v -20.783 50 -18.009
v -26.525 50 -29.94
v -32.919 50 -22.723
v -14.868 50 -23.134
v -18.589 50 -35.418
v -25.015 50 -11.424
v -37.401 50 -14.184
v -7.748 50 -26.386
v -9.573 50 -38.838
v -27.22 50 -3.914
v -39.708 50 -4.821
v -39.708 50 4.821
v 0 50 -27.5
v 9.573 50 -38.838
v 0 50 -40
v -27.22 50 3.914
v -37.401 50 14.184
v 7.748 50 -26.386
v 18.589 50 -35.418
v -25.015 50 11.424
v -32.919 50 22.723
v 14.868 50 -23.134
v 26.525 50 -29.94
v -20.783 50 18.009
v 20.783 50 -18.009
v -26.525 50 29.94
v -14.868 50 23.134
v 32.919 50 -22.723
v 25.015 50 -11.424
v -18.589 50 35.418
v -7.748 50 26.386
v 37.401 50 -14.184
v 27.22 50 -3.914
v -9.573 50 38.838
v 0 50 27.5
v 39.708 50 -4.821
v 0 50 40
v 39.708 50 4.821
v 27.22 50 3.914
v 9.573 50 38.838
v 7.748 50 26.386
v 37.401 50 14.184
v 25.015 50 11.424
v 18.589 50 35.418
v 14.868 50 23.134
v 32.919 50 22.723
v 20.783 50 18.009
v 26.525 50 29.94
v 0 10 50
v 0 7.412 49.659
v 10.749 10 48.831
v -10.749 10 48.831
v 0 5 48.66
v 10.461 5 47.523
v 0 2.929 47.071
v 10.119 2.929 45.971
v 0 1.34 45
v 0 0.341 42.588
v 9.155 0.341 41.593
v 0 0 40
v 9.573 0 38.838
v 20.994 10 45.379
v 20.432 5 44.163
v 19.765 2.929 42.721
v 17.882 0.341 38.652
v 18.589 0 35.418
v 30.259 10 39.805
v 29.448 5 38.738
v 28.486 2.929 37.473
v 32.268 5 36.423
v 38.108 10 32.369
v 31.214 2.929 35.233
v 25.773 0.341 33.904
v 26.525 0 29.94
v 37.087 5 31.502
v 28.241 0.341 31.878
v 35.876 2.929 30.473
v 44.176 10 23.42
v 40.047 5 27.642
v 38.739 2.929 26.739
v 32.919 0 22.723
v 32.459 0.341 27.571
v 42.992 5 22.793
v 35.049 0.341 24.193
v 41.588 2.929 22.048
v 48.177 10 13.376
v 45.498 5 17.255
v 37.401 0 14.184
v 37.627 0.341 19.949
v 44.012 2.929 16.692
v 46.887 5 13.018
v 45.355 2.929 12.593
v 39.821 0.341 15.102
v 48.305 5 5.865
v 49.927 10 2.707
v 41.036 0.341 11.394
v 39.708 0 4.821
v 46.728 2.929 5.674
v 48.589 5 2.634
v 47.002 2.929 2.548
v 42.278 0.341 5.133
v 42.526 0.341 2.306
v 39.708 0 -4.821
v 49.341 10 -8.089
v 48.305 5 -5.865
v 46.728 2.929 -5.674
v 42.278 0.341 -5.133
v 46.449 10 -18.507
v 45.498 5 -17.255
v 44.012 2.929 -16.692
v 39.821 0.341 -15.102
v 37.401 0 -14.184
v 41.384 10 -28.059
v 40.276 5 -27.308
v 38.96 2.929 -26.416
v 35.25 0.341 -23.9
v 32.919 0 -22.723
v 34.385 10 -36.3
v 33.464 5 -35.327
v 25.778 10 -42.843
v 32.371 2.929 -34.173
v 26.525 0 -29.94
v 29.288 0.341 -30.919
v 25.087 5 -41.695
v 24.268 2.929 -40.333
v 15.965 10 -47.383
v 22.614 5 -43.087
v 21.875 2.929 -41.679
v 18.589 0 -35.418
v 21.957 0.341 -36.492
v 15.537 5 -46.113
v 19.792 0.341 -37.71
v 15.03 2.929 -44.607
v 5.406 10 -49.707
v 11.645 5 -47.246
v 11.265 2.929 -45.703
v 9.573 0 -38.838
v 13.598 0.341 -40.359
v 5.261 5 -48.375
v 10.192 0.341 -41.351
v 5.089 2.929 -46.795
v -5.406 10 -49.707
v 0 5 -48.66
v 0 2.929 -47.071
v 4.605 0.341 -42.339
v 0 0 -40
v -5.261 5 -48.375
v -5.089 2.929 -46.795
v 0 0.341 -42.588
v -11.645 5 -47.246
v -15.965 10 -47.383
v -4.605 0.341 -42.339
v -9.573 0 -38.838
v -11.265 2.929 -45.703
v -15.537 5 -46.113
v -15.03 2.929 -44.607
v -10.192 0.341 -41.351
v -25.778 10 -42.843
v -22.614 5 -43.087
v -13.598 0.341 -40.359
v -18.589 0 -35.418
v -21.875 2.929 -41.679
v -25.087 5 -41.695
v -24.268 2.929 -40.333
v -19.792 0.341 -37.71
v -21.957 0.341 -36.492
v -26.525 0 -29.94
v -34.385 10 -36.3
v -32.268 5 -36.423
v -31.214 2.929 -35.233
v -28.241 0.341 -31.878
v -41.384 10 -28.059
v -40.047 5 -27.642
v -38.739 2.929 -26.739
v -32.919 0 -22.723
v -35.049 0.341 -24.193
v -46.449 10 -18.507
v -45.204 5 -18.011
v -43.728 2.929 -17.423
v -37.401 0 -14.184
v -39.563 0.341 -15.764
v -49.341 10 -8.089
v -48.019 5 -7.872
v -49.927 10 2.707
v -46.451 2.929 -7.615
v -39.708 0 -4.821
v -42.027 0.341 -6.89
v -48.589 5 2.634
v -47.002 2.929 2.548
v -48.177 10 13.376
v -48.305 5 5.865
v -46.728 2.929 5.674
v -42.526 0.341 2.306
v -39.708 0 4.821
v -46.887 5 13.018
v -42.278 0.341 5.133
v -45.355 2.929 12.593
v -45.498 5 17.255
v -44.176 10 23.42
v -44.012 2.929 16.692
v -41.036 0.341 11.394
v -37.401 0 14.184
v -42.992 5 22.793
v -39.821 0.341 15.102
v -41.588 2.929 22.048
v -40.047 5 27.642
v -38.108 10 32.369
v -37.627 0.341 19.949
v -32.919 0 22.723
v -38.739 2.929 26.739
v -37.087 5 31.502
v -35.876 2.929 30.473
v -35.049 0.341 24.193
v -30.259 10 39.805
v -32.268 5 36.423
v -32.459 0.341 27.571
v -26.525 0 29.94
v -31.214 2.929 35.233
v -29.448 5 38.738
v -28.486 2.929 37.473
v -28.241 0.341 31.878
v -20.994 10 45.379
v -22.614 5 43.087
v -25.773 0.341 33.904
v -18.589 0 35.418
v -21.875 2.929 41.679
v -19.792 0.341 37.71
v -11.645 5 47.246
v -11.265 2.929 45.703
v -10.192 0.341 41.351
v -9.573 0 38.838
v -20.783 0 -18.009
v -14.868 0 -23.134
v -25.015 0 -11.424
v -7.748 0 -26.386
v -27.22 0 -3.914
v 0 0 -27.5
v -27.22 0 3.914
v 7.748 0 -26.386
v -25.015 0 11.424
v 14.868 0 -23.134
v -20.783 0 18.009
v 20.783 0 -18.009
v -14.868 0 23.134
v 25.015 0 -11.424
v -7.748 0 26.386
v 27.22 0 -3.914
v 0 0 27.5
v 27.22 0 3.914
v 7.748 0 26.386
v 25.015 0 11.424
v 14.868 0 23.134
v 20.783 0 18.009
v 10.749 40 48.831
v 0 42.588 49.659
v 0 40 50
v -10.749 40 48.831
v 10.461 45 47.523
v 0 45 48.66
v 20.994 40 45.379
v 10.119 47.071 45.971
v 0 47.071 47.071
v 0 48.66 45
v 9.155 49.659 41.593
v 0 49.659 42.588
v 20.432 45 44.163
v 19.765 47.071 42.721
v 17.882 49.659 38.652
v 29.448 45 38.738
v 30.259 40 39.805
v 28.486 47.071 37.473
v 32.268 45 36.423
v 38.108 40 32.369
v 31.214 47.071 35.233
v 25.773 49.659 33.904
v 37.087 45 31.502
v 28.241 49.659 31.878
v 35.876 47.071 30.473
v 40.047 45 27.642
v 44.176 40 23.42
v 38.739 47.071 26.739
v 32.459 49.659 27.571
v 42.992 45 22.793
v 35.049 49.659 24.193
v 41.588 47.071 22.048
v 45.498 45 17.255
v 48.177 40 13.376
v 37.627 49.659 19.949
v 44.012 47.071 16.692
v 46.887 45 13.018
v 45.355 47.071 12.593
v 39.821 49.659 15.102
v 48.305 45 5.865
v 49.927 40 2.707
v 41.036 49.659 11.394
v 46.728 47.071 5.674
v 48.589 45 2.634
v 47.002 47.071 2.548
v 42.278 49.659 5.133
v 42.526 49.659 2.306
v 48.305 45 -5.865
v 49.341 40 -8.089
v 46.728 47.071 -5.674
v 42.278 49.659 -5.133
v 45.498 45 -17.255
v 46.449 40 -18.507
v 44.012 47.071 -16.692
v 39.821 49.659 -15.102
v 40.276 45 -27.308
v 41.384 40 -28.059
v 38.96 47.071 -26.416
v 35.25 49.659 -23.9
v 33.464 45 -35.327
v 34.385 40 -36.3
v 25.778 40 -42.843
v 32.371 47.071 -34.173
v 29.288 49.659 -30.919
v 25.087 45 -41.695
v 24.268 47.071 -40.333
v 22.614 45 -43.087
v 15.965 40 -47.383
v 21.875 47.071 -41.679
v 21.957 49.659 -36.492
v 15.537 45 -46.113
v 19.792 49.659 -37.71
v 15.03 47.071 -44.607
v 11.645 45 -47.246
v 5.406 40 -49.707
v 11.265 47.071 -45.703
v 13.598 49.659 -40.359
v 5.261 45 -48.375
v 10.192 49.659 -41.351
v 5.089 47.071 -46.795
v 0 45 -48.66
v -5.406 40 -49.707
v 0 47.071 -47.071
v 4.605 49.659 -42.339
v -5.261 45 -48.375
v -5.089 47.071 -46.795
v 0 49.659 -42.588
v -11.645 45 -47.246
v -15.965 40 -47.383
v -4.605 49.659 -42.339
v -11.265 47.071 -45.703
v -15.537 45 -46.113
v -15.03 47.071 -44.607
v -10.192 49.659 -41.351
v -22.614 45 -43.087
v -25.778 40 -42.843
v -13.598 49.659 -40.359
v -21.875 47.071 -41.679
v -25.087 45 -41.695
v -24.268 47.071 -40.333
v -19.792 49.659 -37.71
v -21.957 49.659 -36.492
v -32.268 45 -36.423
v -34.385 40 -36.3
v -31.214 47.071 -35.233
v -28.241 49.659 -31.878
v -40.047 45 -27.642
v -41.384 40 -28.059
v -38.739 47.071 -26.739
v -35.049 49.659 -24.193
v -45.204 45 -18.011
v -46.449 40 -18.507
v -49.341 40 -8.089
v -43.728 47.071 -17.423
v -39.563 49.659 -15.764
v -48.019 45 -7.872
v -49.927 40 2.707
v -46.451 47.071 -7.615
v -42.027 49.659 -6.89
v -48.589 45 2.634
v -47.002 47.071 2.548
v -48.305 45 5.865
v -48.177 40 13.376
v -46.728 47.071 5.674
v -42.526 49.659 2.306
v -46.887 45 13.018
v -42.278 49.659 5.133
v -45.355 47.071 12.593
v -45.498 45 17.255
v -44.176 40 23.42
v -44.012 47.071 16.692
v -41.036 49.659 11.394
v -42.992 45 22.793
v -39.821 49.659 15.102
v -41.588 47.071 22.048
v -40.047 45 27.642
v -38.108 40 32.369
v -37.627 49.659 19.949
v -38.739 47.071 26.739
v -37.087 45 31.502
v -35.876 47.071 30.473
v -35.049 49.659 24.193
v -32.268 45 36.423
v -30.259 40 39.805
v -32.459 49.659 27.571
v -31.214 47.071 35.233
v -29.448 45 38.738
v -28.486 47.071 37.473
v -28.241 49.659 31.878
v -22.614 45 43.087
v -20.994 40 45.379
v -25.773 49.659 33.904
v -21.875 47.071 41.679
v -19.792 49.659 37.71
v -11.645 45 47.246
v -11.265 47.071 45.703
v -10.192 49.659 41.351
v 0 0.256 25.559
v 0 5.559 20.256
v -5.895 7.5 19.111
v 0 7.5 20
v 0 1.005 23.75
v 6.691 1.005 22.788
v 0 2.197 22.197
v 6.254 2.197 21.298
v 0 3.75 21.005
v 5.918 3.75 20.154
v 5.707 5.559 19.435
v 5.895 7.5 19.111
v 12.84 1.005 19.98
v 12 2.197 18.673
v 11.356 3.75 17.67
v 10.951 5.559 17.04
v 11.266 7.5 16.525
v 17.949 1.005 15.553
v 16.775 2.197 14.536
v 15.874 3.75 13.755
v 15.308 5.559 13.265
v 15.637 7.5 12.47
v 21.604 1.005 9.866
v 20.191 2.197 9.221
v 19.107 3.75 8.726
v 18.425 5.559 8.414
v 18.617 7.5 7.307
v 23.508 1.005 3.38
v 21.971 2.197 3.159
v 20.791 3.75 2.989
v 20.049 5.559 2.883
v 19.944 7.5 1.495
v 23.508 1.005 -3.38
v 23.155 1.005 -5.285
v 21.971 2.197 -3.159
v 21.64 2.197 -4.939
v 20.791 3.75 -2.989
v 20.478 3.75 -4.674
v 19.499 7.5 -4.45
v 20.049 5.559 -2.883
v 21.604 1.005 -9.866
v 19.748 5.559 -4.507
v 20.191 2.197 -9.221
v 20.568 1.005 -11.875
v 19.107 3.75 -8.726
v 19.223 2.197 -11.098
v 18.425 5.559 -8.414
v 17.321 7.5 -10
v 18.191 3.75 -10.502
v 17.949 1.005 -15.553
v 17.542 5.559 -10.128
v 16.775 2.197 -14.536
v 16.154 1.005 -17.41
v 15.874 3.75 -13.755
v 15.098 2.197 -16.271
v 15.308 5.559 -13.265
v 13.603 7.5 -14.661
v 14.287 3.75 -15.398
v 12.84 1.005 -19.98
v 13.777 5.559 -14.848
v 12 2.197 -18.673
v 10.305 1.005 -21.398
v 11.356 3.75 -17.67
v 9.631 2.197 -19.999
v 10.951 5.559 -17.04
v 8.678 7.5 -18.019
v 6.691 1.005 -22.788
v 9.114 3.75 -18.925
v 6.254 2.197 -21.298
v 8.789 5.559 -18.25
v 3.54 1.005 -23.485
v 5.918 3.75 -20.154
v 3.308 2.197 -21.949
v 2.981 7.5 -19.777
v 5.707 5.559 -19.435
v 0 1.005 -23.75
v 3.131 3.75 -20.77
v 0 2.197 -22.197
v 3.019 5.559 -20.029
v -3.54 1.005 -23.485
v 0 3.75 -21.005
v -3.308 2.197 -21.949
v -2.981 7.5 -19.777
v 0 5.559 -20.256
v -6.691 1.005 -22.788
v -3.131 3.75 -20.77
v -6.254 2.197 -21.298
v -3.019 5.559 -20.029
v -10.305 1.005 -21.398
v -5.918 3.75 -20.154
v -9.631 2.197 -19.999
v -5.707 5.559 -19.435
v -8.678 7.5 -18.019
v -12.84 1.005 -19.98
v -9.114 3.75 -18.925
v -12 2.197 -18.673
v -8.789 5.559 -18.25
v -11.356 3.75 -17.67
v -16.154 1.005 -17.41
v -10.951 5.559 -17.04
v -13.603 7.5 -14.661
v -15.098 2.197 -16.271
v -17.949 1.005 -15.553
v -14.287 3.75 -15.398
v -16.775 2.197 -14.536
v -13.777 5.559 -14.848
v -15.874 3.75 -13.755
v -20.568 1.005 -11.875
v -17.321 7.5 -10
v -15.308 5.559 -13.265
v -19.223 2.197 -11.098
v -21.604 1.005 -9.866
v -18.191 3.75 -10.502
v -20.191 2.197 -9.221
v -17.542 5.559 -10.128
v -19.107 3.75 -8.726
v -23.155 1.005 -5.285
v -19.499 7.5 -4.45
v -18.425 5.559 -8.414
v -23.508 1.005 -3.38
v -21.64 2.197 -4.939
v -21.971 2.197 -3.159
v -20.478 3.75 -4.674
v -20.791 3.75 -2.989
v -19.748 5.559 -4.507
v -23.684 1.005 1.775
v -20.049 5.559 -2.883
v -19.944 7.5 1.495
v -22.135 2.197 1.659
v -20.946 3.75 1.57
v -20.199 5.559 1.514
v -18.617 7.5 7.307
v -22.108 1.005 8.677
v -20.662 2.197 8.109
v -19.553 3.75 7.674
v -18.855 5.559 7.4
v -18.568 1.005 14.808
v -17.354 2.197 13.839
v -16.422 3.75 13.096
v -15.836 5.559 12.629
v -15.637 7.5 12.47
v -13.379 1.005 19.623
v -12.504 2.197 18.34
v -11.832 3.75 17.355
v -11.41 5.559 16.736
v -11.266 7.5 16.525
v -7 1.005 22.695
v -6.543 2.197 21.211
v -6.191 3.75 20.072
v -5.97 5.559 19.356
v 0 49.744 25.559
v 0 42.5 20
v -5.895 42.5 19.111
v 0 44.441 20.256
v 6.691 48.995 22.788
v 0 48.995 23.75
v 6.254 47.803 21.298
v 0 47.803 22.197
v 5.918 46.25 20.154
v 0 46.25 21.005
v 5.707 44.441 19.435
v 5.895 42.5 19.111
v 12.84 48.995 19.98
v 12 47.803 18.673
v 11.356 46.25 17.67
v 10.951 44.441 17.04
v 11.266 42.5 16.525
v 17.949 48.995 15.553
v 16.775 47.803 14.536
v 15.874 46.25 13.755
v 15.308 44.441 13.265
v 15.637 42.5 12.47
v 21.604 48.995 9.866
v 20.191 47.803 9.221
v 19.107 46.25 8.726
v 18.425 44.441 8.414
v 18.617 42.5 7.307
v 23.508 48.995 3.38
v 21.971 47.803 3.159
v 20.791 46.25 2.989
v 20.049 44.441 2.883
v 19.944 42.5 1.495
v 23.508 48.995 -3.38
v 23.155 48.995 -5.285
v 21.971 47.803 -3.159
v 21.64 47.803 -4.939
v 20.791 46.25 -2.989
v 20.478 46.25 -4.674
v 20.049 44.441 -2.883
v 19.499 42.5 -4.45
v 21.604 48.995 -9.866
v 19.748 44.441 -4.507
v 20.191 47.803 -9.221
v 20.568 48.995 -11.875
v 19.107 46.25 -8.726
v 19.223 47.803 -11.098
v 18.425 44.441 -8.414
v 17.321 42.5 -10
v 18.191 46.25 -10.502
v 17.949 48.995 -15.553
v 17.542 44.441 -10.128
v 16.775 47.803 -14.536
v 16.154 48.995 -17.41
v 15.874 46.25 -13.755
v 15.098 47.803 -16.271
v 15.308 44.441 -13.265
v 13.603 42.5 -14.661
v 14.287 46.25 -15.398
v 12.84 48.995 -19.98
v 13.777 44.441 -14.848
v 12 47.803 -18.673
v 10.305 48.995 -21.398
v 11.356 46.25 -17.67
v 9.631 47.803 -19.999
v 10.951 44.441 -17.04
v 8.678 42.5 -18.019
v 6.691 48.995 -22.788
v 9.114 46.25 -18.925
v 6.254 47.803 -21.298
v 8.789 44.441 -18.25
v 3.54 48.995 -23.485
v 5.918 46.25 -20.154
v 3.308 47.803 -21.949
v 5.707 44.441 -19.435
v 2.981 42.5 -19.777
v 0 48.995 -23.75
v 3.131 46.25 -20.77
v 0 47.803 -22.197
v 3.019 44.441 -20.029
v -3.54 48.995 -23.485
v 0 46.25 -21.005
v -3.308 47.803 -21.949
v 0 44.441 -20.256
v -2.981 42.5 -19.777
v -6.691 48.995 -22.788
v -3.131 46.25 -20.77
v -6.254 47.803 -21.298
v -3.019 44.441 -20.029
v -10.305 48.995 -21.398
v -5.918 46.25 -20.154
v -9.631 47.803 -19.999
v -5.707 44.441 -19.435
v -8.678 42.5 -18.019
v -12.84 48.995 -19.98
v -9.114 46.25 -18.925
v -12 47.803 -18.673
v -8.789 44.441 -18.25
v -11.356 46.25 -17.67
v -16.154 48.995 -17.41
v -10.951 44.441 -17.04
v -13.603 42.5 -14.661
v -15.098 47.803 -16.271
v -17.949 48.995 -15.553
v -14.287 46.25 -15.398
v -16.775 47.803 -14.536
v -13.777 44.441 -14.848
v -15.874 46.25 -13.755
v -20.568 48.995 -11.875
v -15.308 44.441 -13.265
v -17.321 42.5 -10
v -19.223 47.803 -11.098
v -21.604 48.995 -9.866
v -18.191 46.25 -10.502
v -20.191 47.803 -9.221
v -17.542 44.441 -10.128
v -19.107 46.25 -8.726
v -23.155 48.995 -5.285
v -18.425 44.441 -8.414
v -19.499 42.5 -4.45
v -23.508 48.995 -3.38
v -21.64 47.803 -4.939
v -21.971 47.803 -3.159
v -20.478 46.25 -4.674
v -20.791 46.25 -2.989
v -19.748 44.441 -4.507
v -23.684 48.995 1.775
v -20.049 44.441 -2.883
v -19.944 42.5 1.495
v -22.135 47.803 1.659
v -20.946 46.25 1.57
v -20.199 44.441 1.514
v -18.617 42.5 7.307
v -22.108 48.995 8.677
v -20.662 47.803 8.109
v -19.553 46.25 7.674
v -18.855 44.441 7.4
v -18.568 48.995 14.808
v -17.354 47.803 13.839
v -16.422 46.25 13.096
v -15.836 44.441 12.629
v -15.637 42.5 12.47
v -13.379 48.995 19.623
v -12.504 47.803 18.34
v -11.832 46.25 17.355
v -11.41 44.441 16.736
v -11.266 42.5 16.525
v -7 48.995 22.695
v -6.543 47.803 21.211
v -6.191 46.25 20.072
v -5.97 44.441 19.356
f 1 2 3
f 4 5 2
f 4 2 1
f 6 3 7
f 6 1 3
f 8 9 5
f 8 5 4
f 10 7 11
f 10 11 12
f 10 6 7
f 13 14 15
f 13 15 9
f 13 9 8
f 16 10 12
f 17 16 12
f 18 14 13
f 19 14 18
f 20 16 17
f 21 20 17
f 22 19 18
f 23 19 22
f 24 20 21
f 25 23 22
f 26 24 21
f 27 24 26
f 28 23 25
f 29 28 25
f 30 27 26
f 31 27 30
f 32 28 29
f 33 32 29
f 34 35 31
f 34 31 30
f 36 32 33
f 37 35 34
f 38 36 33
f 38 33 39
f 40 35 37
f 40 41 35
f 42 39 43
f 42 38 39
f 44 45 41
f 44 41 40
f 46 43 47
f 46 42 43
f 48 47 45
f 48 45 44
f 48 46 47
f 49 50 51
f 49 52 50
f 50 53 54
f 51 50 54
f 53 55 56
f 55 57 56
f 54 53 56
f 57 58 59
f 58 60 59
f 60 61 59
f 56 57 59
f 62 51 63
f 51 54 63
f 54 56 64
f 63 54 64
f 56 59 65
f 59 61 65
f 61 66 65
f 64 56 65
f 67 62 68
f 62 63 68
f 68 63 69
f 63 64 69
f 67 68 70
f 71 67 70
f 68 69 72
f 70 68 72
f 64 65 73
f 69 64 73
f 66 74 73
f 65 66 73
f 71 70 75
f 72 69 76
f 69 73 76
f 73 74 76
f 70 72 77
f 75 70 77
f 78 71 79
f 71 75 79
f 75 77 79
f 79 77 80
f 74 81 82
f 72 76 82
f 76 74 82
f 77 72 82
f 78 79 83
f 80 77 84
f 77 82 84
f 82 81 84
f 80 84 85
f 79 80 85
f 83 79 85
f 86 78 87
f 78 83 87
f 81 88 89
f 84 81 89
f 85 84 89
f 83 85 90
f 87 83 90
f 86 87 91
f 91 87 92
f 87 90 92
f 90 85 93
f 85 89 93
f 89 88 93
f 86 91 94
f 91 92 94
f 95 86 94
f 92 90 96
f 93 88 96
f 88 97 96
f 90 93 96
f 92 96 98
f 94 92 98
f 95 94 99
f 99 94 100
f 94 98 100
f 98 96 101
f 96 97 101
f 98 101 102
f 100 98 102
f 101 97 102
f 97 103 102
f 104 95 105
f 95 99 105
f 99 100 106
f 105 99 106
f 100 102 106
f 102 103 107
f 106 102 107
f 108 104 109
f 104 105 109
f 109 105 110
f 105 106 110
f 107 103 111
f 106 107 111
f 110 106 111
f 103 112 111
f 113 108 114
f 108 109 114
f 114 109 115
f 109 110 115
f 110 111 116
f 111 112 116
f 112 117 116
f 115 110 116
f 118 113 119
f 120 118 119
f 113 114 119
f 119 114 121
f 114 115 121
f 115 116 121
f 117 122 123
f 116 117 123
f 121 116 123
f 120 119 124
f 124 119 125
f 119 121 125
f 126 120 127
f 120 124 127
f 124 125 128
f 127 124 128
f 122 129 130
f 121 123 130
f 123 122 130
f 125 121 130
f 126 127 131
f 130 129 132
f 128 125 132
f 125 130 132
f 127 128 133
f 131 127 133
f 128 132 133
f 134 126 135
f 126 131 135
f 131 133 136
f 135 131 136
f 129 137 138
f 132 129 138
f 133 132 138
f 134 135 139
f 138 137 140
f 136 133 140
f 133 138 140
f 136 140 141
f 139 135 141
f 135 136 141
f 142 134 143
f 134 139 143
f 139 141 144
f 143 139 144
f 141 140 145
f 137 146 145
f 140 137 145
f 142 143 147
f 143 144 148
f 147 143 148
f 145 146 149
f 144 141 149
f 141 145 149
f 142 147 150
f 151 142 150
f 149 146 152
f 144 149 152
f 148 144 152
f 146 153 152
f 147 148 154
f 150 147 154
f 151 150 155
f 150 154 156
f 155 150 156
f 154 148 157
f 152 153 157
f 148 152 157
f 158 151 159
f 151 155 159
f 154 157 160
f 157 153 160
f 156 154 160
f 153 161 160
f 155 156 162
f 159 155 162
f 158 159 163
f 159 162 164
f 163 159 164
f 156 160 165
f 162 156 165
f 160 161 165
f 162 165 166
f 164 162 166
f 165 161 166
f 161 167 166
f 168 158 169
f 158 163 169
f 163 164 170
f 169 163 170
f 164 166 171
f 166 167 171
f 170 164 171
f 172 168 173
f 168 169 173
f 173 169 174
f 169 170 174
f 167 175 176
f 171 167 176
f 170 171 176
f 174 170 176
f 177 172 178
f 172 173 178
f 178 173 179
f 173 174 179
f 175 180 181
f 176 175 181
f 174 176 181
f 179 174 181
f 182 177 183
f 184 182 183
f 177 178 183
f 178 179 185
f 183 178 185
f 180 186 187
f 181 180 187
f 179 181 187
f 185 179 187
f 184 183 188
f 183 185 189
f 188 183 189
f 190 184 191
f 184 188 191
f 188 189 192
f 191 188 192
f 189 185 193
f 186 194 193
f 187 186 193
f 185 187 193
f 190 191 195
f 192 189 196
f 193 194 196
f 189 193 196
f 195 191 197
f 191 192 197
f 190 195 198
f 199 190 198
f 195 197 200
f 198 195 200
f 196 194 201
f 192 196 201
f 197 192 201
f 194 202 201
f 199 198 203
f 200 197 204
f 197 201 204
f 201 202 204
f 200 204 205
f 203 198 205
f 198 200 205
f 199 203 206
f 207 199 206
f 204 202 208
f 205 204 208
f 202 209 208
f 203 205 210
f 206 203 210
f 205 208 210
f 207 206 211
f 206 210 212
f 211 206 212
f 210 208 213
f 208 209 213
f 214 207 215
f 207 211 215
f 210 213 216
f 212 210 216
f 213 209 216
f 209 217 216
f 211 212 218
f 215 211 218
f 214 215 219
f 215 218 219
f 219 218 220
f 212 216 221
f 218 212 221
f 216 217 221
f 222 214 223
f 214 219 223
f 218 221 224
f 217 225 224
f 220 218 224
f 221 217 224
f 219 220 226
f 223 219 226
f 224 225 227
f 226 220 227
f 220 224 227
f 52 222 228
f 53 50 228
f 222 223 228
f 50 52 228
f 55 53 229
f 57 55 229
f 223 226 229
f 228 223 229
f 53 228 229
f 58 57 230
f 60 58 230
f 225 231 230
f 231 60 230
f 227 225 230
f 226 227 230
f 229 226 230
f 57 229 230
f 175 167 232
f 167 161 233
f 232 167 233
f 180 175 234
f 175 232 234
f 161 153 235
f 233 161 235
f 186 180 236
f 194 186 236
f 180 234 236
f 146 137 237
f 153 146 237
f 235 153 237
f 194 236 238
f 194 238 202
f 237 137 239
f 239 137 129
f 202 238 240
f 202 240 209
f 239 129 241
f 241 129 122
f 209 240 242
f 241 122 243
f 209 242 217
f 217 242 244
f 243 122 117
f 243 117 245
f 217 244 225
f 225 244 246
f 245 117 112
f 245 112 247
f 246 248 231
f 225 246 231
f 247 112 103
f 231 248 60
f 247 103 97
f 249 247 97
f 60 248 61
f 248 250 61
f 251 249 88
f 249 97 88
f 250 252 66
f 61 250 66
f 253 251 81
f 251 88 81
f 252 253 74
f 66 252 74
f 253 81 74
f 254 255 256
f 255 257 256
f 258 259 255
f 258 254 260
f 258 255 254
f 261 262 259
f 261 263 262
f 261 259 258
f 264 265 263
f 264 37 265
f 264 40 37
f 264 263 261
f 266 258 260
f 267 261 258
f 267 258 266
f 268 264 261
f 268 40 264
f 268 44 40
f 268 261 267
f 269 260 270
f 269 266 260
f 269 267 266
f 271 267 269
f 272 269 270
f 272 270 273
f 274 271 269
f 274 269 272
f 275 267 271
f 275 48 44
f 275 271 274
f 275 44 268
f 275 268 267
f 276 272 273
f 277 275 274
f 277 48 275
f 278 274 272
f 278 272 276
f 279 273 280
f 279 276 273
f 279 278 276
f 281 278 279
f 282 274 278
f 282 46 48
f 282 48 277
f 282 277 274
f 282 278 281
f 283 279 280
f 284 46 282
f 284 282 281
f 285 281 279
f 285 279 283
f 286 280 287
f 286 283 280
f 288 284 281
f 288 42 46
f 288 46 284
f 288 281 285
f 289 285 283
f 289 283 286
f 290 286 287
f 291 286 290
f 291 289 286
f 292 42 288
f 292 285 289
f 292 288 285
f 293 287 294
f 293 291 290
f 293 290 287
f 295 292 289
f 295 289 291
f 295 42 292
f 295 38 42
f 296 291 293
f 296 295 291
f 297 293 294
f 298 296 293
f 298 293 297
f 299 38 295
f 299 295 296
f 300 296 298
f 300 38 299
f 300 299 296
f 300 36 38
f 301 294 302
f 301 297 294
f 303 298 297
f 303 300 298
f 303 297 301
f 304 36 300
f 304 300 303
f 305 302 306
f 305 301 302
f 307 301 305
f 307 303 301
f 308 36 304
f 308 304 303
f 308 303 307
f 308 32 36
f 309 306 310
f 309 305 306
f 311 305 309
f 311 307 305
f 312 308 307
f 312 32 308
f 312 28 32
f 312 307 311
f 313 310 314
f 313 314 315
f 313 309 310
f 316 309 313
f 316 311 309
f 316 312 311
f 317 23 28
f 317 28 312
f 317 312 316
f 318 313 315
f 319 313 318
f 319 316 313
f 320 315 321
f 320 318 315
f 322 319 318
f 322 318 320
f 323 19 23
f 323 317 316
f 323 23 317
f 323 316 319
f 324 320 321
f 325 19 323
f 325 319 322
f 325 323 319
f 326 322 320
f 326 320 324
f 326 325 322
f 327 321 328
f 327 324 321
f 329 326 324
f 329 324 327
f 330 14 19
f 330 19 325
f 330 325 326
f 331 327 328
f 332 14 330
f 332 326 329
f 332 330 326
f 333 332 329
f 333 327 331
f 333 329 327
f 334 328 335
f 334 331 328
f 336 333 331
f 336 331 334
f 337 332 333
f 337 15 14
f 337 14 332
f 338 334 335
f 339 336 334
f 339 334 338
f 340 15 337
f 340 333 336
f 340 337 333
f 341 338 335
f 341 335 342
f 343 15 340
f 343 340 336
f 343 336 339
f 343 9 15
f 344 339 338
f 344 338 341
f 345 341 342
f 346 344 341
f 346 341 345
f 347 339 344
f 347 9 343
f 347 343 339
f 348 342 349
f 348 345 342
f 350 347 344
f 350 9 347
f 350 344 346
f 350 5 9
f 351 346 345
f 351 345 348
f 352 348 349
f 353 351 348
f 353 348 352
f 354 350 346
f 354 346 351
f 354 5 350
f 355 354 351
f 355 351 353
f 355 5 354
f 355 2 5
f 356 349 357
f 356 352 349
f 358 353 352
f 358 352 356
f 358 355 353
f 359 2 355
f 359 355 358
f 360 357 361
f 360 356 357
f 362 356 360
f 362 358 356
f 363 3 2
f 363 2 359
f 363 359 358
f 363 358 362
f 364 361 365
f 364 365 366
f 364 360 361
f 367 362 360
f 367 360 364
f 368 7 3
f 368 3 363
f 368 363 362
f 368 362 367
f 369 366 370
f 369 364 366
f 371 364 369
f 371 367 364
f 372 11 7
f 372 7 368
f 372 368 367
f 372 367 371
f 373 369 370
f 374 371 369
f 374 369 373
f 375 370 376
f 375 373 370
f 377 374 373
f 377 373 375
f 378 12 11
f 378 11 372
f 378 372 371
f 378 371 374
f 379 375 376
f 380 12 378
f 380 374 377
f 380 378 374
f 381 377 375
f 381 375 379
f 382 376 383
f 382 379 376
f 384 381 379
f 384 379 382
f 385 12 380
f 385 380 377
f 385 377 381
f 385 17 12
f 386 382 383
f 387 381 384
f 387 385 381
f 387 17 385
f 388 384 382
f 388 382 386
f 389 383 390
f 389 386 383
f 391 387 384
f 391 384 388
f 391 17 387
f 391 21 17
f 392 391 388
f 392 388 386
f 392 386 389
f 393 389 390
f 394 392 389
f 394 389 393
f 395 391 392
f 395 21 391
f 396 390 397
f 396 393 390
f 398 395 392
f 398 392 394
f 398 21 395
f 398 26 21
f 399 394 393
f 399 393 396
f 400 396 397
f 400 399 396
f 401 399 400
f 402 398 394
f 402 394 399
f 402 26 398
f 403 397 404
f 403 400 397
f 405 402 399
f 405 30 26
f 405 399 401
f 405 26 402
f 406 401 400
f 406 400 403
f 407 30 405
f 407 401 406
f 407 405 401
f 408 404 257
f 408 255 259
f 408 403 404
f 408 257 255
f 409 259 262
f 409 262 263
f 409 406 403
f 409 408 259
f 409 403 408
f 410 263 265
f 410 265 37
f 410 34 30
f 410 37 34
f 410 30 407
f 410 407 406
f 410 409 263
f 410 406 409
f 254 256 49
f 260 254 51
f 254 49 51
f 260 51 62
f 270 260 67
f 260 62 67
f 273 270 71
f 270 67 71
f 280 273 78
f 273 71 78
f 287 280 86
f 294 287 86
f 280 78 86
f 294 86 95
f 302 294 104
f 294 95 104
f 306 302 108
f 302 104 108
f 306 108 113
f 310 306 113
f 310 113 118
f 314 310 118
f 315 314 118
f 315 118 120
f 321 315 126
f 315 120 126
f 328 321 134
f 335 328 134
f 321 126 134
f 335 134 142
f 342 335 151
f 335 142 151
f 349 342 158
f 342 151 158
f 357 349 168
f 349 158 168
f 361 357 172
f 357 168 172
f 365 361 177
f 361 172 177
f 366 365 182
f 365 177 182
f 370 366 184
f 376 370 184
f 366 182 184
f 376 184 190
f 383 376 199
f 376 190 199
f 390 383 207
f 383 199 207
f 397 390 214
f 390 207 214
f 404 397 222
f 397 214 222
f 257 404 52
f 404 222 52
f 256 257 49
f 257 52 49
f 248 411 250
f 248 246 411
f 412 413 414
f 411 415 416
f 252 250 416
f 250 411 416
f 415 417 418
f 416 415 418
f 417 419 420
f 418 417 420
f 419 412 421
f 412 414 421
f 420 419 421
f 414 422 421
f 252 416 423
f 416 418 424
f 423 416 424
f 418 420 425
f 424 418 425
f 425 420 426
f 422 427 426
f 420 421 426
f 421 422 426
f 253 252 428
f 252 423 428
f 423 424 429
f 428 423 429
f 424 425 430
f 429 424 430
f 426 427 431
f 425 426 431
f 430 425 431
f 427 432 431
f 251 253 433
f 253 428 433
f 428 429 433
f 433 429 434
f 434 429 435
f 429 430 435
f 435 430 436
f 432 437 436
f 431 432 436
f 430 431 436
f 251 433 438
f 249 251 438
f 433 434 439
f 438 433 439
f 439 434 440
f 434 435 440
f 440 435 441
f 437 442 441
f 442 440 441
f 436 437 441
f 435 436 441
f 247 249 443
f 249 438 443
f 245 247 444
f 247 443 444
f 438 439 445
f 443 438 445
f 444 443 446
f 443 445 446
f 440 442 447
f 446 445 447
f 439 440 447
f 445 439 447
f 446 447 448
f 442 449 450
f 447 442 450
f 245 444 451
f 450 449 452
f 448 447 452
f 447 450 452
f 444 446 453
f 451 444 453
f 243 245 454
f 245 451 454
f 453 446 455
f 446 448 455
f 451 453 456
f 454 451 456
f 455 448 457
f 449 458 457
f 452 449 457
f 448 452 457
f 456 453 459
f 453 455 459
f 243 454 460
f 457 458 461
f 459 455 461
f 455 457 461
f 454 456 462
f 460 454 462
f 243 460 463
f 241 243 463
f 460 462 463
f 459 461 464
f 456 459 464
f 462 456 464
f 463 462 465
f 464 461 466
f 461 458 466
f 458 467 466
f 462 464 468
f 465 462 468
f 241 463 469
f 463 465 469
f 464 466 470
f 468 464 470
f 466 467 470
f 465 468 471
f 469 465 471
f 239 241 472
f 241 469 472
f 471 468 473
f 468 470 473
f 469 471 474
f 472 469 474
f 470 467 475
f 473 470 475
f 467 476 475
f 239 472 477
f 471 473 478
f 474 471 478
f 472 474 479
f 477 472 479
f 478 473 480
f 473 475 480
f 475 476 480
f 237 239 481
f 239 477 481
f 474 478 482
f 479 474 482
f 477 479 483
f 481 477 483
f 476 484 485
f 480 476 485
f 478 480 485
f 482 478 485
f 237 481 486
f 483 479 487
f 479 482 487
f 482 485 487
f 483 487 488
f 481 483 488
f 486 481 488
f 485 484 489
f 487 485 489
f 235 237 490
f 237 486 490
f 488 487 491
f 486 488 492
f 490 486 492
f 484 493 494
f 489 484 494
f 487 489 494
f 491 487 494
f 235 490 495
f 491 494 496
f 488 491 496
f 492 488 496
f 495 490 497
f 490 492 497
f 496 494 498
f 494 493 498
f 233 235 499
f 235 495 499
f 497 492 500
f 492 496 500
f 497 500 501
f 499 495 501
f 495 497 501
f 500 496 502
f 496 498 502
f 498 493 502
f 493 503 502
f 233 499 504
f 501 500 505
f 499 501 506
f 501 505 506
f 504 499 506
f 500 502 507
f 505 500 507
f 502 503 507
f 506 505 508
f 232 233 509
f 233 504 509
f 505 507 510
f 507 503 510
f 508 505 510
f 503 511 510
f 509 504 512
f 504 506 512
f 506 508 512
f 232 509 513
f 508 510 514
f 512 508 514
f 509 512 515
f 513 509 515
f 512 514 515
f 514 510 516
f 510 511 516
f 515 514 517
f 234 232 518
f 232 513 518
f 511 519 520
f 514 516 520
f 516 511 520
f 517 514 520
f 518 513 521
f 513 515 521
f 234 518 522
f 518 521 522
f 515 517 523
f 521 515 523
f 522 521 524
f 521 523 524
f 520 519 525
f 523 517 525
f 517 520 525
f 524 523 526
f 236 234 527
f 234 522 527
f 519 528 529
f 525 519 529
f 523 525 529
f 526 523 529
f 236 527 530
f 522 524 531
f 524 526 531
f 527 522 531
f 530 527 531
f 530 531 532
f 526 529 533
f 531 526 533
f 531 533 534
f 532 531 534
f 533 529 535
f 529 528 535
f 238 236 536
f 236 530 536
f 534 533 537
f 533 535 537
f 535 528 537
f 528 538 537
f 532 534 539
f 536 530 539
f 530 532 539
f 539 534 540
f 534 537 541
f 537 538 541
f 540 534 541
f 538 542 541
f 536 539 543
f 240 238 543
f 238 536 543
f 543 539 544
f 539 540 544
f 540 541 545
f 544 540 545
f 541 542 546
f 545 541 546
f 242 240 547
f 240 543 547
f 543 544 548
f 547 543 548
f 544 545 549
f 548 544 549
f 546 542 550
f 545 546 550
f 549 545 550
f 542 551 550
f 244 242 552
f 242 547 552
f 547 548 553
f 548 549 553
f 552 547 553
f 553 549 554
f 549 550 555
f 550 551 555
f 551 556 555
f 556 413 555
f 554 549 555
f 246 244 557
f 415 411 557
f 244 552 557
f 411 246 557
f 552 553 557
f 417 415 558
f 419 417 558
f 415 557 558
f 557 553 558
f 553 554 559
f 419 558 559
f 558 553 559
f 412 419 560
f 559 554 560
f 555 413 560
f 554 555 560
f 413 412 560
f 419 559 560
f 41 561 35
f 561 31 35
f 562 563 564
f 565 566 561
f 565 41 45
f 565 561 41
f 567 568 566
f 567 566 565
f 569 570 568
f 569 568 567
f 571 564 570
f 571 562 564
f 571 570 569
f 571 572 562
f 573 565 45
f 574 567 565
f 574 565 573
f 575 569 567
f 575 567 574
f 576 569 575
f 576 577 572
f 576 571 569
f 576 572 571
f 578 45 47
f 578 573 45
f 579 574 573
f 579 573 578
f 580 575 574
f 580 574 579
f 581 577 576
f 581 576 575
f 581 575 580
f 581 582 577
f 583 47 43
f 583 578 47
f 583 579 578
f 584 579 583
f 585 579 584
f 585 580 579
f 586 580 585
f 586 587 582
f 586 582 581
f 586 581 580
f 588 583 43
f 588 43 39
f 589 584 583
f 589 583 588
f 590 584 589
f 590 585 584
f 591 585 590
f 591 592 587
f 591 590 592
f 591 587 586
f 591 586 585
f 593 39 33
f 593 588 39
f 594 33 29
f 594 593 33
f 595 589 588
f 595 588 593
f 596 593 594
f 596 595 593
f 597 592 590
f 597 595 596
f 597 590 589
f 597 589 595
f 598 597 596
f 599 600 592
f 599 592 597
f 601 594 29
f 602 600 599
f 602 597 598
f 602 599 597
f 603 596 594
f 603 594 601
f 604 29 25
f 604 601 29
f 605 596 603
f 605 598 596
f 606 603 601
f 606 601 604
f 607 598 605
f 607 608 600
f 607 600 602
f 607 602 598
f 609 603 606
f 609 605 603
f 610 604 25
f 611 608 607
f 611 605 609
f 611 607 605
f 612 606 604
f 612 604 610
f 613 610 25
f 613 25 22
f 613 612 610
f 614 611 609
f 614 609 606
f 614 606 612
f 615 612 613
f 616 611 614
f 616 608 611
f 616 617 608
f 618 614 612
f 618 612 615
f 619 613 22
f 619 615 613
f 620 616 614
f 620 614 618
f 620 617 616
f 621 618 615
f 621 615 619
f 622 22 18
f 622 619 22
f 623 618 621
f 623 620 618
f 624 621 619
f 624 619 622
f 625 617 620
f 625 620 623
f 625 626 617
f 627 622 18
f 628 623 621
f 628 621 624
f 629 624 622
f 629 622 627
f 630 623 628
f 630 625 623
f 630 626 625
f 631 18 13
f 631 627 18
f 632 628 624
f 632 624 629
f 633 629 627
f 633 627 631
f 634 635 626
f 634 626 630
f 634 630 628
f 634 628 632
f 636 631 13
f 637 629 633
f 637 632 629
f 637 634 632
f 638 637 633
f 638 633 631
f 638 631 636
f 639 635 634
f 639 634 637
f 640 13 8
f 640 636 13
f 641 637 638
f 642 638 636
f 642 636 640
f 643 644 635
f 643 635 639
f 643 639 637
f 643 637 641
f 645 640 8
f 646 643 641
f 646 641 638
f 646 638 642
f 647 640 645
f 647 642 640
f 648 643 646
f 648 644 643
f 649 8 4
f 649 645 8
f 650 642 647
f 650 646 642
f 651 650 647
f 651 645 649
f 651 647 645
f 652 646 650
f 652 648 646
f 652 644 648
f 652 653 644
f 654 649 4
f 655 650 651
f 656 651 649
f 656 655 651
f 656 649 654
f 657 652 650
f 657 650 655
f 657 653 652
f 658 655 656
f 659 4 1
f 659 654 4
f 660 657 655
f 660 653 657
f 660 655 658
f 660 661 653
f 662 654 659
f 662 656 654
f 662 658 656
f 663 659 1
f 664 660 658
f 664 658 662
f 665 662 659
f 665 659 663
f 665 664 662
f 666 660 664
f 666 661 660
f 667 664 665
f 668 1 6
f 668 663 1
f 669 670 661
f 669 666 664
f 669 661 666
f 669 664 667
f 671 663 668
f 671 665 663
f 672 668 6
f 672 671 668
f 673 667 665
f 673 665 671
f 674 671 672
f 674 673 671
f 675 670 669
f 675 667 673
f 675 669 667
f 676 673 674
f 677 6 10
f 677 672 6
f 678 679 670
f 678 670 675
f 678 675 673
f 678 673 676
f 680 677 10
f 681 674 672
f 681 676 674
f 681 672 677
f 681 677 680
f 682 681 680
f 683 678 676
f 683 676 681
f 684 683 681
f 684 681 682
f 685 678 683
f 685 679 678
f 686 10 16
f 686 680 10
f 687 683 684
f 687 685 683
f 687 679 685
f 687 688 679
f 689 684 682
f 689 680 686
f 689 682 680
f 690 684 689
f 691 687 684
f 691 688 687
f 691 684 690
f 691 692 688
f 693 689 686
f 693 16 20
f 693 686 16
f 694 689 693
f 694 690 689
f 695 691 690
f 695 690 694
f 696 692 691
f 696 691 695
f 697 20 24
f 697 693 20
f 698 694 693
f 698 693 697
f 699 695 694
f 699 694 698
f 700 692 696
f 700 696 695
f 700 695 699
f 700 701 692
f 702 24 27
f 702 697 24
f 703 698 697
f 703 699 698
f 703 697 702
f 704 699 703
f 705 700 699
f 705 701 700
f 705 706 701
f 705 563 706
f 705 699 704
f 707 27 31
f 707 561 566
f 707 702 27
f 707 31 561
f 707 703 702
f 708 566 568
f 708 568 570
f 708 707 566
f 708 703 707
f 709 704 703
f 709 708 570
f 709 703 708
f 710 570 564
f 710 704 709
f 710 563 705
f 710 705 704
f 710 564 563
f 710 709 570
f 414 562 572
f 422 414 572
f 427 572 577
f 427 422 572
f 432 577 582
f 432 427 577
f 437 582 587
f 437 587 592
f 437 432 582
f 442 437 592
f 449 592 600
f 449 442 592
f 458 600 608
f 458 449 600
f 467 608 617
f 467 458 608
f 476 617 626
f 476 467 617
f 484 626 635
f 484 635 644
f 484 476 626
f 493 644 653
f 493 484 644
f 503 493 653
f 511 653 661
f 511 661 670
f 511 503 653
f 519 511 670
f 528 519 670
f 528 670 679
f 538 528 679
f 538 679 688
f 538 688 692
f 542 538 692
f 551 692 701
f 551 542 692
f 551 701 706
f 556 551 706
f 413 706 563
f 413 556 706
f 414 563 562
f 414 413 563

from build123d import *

# Parameters (mm, degrees)
CROQUIS1_R              = 50
CROQUIS1_R_2            = 20
SALIENTE_EXTRUIR3_DEPTH = 50
REDONDEO5_R             = 10
REDONDEO6_R             = 7.5


with BuildPart() as part:
    # Croquis1 → Saliente-Extruir3 (new body)
    with BuildSketch(Plane(origin=(0, 0, 0), x_dir=(1, 0, 0), z_dir=(0, 1, 0))):
        with Locations(Location((0, 0, 0), (0, 0, 270))):
            Circle(CROQUIS1_R)
        with Locations(Location((0, 0, 0), (0, 0, 270))):
            Circle(CROQUIS1_R_2, mode=Mode.SUBTRACT)
    extrude(amount=SALIENTE_EXTRUIR3_DEPTH)

    # Redondeo5
    redondeo5_edges = [part.edges().sort_by_distance(p)[0] for p in [
        (0, 0, -50),
        (0, 50, -50),
    ]]
    fillet(redondeo5_edges, radius=REDONDEO5_R)

    # Redondeo6
    redondeo6_edges = [part.edges().sort_by_distance(p)[0] for p in [
        (0, 0, -20),
        (0, 50, -20),
    ]]
    fillet(redondeo6_edges, radius=REDONDEO6_R)


solid = part.part
